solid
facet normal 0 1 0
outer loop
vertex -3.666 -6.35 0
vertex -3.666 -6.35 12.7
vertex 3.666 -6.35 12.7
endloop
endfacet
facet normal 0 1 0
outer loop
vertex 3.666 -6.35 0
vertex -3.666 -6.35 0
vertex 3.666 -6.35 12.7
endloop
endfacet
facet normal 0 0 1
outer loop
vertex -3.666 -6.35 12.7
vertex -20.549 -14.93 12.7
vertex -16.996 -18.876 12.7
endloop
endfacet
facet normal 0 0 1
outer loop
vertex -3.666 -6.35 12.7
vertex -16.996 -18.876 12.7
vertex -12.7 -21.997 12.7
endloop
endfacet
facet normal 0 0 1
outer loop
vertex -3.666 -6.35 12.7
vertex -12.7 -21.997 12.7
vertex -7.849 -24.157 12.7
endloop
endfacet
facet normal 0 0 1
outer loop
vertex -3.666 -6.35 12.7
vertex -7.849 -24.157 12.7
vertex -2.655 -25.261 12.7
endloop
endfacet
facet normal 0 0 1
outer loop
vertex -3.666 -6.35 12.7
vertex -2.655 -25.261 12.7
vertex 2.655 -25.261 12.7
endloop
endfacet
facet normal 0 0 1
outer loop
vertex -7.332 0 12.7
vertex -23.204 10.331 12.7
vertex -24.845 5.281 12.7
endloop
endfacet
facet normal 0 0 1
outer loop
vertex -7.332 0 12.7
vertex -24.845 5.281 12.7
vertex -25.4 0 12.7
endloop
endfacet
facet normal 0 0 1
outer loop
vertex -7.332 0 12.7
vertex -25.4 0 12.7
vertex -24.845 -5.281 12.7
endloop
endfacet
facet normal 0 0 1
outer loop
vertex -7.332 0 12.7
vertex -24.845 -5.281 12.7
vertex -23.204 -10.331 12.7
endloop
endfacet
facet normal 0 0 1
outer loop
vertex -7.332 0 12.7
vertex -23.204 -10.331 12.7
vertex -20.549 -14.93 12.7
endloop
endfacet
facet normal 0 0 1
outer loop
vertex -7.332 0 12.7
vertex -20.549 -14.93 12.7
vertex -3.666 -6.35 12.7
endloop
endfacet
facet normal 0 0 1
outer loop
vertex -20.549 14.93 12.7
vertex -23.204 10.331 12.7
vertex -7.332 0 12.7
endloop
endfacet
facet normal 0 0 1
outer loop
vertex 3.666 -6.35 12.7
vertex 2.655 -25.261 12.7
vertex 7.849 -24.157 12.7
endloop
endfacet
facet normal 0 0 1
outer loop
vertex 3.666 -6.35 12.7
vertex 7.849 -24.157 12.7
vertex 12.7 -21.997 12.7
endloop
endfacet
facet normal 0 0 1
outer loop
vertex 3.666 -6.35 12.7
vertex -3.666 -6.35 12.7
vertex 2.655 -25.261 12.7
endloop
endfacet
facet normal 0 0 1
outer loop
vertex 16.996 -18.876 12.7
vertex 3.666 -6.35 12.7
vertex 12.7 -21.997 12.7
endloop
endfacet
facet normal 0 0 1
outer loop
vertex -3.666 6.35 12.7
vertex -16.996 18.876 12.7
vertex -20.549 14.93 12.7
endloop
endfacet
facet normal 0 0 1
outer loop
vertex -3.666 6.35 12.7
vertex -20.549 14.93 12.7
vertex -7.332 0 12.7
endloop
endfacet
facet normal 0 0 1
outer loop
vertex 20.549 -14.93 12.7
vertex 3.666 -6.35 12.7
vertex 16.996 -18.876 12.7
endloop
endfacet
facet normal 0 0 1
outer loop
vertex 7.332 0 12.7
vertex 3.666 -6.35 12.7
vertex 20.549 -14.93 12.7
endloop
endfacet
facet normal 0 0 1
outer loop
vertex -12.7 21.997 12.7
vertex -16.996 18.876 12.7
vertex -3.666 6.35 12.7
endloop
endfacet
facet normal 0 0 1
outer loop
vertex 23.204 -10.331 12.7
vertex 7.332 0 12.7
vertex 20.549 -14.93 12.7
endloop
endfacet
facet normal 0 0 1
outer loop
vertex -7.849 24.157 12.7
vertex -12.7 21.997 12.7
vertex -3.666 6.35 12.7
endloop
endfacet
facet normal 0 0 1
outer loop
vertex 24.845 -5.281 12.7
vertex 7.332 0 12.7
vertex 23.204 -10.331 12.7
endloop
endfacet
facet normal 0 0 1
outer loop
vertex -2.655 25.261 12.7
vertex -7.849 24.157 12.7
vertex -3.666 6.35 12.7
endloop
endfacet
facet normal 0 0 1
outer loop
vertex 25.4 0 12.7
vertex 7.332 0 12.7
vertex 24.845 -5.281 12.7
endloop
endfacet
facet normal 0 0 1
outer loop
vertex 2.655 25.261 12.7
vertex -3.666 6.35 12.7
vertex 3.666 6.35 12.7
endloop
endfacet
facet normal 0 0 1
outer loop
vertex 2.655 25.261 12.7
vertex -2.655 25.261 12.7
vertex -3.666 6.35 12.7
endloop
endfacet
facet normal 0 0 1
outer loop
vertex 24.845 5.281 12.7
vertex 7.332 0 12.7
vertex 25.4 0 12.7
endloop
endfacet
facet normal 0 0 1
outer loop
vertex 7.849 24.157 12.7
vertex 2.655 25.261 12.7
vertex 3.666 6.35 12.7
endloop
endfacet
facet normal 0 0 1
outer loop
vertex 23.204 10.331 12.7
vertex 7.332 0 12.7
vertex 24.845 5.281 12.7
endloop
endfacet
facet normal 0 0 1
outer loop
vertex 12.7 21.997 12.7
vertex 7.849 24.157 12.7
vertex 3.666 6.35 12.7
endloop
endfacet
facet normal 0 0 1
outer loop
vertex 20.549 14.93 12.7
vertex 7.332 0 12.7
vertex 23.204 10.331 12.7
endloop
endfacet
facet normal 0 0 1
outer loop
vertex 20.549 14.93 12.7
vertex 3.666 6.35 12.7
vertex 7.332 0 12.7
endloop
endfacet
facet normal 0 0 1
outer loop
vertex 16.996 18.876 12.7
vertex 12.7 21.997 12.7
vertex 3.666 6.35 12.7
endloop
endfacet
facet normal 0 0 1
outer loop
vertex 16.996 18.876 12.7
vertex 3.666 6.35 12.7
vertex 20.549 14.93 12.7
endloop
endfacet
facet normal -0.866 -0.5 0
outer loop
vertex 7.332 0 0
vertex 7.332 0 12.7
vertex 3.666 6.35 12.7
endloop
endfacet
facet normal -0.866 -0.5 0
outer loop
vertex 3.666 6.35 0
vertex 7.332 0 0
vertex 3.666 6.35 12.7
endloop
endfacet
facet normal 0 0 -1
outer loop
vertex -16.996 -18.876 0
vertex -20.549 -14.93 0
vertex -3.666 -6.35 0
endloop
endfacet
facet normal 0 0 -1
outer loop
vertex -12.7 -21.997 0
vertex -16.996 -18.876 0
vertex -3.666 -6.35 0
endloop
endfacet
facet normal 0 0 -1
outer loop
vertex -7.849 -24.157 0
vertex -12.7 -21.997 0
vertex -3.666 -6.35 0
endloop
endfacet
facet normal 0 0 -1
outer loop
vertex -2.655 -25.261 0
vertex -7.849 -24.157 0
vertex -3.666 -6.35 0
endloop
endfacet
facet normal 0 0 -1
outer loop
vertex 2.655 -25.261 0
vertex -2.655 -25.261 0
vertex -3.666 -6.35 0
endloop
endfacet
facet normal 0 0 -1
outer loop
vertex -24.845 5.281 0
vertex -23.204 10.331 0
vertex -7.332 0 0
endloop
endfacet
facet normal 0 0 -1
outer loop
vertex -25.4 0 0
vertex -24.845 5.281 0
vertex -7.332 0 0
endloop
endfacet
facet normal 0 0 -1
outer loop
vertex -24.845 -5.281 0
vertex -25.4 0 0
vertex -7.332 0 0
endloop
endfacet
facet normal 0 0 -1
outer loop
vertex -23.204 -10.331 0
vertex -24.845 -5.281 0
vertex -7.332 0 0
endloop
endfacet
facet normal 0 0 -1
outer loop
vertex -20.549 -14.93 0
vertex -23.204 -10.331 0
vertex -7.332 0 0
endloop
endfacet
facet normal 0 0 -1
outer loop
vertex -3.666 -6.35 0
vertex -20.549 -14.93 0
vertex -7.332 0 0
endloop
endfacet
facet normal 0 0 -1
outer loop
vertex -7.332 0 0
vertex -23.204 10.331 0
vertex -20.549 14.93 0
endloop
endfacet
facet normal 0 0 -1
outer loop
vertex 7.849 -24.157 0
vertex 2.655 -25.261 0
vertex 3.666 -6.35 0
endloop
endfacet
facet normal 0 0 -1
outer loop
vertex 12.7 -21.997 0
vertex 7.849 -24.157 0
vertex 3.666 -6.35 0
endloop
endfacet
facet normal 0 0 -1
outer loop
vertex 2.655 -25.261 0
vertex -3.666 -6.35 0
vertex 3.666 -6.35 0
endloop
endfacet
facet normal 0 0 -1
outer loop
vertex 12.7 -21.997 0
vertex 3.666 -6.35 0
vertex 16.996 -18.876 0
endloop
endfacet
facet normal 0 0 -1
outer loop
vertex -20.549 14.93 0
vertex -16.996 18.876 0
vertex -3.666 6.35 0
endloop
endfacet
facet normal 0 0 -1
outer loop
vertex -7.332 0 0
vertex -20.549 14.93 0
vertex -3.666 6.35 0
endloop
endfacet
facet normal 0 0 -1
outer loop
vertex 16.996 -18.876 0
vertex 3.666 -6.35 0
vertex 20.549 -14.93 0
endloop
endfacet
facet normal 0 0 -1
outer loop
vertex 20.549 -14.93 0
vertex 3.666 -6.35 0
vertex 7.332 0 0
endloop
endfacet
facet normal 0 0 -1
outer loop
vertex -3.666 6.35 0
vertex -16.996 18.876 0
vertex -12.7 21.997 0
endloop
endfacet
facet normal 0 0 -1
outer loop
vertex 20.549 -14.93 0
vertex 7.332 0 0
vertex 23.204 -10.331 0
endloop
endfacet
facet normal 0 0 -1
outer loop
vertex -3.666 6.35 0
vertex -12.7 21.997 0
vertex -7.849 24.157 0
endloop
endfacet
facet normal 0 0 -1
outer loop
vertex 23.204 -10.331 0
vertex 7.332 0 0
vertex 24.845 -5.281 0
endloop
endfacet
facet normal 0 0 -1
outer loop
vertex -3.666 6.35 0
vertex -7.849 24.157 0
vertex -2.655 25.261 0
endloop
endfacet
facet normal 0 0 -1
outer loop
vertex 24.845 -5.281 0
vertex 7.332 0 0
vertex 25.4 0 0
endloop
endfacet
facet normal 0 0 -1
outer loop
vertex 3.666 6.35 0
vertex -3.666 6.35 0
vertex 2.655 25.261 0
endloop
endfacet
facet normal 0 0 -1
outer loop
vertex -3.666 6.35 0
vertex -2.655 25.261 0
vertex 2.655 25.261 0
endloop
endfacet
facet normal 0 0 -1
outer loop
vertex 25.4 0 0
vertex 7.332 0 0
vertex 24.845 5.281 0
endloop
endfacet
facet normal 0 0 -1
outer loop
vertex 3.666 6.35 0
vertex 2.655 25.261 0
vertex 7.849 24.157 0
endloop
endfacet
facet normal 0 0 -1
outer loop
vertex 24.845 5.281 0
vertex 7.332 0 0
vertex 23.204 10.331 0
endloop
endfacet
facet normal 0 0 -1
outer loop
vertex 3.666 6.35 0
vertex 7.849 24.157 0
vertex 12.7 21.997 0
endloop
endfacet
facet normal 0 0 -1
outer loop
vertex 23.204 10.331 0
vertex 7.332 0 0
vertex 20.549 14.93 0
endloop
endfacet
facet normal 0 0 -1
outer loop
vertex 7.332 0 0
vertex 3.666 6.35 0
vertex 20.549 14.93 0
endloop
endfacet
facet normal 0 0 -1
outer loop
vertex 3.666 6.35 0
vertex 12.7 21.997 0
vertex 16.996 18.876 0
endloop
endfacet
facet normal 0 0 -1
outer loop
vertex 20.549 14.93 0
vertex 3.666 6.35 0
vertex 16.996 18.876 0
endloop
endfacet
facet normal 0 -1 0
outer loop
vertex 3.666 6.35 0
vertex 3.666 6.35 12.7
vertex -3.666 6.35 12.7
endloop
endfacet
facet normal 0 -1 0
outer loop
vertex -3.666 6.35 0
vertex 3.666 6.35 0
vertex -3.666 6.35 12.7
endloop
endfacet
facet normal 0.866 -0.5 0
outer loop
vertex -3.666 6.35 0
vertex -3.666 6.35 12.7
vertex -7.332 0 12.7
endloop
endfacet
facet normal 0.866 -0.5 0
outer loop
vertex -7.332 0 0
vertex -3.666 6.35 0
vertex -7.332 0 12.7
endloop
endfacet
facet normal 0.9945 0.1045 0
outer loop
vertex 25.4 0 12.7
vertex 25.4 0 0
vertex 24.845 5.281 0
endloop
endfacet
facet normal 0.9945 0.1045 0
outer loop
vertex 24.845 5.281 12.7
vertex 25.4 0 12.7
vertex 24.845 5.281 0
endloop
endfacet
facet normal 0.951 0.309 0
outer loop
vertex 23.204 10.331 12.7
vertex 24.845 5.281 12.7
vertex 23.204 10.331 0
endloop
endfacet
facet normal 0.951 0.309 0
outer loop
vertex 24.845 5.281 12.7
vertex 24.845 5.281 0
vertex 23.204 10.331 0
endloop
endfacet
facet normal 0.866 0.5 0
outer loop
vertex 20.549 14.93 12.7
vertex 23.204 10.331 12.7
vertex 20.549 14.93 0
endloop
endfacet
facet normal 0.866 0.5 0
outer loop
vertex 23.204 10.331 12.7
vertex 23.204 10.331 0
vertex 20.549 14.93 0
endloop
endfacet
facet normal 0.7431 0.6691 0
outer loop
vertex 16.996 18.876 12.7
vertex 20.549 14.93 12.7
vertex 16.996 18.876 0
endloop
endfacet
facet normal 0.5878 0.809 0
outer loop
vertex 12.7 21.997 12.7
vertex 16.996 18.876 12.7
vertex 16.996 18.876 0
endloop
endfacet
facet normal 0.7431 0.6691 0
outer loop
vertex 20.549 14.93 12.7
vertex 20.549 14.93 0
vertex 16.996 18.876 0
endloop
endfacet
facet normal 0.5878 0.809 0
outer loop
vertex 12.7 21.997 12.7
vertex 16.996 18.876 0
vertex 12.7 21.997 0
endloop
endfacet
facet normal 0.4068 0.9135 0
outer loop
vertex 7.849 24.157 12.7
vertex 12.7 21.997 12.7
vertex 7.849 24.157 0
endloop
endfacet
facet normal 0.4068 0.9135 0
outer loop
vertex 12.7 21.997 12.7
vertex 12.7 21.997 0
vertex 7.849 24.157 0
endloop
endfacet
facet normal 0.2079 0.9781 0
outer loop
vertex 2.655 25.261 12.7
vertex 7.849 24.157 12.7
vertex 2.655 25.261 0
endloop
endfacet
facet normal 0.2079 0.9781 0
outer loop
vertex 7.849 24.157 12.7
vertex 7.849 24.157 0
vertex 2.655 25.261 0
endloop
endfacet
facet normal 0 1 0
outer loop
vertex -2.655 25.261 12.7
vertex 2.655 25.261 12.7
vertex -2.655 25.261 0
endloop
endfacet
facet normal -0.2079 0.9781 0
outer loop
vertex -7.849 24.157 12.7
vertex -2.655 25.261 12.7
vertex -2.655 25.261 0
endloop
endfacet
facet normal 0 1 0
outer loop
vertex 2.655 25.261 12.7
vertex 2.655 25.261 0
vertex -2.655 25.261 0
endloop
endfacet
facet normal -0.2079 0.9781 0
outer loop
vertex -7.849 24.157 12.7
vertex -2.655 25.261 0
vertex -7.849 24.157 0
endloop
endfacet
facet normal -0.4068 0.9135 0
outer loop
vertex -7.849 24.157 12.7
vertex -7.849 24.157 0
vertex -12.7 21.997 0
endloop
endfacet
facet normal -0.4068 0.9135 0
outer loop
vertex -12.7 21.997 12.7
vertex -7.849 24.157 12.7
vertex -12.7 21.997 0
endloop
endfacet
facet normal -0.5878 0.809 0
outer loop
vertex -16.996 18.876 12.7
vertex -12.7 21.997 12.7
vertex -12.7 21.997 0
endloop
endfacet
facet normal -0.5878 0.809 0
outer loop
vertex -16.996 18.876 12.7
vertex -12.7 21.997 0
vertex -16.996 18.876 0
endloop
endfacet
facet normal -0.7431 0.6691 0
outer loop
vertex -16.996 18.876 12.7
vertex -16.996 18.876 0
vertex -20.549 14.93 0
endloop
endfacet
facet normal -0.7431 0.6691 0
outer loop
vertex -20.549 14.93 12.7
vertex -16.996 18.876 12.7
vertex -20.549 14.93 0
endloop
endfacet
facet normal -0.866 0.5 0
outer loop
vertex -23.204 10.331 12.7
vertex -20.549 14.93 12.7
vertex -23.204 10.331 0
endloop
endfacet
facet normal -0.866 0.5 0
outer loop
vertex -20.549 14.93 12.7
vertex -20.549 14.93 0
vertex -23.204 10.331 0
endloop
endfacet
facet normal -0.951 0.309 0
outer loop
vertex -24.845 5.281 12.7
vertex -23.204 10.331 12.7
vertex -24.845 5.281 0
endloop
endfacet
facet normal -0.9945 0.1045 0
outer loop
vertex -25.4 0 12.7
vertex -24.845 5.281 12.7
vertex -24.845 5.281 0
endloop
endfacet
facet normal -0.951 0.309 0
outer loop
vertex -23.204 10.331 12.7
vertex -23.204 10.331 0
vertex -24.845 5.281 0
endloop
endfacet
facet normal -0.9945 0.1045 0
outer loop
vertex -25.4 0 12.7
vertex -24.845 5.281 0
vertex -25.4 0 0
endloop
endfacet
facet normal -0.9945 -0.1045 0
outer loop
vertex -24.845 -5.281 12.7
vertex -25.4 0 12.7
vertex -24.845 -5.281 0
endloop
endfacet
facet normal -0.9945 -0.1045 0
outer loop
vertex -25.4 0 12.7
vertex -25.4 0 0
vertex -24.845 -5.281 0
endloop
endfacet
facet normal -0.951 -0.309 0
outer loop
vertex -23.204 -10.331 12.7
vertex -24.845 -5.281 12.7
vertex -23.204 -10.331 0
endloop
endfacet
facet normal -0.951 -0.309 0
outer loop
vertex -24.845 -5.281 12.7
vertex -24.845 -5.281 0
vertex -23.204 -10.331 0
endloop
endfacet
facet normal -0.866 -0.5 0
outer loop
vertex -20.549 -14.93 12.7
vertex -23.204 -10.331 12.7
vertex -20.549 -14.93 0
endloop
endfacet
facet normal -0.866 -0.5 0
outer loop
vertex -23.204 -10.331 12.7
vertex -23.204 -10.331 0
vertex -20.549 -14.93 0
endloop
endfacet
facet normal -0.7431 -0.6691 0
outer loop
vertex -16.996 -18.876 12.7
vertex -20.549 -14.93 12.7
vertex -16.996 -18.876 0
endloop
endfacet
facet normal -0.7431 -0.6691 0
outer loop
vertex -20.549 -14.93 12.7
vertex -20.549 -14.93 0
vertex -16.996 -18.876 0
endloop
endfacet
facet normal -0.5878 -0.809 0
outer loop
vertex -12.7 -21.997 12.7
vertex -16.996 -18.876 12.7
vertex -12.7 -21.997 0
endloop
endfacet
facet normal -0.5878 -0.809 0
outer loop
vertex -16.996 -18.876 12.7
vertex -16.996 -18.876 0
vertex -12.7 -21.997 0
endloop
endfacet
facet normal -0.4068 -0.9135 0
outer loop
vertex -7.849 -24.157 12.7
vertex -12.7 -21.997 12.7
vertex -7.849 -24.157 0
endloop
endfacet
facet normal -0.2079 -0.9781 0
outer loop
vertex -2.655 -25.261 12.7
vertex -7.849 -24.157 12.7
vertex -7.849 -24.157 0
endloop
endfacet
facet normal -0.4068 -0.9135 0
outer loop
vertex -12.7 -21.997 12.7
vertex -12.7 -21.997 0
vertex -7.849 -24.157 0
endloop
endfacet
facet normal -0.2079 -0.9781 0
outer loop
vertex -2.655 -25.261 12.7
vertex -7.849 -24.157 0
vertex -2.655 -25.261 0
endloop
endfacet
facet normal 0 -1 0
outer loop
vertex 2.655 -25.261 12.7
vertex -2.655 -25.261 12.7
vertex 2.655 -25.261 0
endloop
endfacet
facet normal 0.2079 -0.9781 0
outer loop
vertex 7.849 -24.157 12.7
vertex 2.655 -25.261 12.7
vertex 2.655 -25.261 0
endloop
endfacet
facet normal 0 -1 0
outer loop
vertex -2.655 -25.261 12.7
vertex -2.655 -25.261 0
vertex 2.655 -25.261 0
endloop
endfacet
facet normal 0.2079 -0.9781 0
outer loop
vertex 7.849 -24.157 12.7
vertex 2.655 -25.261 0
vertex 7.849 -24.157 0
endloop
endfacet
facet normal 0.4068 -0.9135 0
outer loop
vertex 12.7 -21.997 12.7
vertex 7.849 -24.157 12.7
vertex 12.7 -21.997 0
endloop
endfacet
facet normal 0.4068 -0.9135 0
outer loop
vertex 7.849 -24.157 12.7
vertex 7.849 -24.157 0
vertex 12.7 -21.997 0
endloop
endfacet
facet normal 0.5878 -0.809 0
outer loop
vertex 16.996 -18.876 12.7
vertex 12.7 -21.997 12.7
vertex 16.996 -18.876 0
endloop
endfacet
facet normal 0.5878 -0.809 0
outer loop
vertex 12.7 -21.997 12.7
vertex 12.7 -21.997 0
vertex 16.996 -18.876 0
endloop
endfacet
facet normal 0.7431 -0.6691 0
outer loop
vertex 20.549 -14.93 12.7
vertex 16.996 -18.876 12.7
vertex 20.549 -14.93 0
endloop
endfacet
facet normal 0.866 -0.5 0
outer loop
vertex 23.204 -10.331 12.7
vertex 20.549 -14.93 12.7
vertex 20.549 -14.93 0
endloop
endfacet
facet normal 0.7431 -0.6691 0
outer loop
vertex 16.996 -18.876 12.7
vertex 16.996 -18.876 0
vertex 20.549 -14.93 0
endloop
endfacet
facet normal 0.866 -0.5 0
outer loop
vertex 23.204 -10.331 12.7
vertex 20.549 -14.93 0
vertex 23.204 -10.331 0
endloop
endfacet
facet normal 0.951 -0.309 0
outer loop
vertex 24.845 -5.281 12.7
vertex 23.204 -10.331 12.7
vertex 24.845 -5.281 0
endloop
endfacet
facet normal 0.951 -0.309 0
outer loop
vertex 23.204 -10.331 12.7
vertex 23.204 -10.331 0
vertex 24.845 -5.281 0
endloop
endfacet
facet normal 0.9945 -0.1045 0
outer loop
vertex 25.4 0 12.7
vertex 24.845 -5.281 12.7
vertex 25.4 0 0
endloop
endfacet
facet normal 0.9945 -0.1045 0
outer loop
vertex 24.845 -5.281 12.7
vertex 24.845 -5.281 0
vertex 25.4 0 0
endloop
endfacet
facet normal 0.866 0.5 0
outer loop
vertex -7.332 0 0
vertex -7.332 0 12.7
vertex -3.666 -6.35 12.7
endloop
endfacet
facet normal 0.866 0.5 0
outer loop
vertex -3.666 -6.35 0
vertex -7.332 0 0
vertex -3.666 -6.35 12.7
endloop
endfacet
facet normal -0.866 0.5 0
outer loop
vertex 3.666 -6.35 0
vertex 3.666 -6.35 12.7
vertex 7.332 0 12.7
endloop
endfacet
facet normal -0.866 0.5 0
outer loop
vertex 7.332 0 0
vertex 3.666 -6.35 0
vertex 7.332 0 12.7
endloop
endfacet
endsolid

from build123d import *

# Parameters (mm, degrees)
SKETCH1_R               = 25.4
BOSS_EXTRUDE1_DEPTH     = 12.7
CUT_EXTRUDE1_DEPTH      = 39.1
CUT_EXTRUDE1_DEPTH_BACK = 39.1


with BuildPart() as part:
    # Sketch1 → Boss-Extrude1 (new body)
    with BuildSketch(Plane.XY):
        Circle(SKETCH1_R)
    extrude(amount=BOSS_EXTRUDE1_DEPTH)

    # Sketch2 → Cut-Extrude1 (cut, two sides: drawn at the far end of the back side and taken through both)
    with BuildSketch(Plane.XY.offset(12.7).offset(-CUT_EXTRUDE1_DEPTH_BACK)):
        Polygon((7.332348419, 0), (3.666174209, 6.35), (-3.666174209, 6.35), (-7.332348419, 0), (-3.666174209, -6.35), (3.666174209, -6.35), align=None)
    extrude(amount=CUT_EXTRUDE1_DEPTH + CUT_EXTRUDE1_DEPTH_BACK, mode=Mode.SUBTRACT)


solid = part.part
